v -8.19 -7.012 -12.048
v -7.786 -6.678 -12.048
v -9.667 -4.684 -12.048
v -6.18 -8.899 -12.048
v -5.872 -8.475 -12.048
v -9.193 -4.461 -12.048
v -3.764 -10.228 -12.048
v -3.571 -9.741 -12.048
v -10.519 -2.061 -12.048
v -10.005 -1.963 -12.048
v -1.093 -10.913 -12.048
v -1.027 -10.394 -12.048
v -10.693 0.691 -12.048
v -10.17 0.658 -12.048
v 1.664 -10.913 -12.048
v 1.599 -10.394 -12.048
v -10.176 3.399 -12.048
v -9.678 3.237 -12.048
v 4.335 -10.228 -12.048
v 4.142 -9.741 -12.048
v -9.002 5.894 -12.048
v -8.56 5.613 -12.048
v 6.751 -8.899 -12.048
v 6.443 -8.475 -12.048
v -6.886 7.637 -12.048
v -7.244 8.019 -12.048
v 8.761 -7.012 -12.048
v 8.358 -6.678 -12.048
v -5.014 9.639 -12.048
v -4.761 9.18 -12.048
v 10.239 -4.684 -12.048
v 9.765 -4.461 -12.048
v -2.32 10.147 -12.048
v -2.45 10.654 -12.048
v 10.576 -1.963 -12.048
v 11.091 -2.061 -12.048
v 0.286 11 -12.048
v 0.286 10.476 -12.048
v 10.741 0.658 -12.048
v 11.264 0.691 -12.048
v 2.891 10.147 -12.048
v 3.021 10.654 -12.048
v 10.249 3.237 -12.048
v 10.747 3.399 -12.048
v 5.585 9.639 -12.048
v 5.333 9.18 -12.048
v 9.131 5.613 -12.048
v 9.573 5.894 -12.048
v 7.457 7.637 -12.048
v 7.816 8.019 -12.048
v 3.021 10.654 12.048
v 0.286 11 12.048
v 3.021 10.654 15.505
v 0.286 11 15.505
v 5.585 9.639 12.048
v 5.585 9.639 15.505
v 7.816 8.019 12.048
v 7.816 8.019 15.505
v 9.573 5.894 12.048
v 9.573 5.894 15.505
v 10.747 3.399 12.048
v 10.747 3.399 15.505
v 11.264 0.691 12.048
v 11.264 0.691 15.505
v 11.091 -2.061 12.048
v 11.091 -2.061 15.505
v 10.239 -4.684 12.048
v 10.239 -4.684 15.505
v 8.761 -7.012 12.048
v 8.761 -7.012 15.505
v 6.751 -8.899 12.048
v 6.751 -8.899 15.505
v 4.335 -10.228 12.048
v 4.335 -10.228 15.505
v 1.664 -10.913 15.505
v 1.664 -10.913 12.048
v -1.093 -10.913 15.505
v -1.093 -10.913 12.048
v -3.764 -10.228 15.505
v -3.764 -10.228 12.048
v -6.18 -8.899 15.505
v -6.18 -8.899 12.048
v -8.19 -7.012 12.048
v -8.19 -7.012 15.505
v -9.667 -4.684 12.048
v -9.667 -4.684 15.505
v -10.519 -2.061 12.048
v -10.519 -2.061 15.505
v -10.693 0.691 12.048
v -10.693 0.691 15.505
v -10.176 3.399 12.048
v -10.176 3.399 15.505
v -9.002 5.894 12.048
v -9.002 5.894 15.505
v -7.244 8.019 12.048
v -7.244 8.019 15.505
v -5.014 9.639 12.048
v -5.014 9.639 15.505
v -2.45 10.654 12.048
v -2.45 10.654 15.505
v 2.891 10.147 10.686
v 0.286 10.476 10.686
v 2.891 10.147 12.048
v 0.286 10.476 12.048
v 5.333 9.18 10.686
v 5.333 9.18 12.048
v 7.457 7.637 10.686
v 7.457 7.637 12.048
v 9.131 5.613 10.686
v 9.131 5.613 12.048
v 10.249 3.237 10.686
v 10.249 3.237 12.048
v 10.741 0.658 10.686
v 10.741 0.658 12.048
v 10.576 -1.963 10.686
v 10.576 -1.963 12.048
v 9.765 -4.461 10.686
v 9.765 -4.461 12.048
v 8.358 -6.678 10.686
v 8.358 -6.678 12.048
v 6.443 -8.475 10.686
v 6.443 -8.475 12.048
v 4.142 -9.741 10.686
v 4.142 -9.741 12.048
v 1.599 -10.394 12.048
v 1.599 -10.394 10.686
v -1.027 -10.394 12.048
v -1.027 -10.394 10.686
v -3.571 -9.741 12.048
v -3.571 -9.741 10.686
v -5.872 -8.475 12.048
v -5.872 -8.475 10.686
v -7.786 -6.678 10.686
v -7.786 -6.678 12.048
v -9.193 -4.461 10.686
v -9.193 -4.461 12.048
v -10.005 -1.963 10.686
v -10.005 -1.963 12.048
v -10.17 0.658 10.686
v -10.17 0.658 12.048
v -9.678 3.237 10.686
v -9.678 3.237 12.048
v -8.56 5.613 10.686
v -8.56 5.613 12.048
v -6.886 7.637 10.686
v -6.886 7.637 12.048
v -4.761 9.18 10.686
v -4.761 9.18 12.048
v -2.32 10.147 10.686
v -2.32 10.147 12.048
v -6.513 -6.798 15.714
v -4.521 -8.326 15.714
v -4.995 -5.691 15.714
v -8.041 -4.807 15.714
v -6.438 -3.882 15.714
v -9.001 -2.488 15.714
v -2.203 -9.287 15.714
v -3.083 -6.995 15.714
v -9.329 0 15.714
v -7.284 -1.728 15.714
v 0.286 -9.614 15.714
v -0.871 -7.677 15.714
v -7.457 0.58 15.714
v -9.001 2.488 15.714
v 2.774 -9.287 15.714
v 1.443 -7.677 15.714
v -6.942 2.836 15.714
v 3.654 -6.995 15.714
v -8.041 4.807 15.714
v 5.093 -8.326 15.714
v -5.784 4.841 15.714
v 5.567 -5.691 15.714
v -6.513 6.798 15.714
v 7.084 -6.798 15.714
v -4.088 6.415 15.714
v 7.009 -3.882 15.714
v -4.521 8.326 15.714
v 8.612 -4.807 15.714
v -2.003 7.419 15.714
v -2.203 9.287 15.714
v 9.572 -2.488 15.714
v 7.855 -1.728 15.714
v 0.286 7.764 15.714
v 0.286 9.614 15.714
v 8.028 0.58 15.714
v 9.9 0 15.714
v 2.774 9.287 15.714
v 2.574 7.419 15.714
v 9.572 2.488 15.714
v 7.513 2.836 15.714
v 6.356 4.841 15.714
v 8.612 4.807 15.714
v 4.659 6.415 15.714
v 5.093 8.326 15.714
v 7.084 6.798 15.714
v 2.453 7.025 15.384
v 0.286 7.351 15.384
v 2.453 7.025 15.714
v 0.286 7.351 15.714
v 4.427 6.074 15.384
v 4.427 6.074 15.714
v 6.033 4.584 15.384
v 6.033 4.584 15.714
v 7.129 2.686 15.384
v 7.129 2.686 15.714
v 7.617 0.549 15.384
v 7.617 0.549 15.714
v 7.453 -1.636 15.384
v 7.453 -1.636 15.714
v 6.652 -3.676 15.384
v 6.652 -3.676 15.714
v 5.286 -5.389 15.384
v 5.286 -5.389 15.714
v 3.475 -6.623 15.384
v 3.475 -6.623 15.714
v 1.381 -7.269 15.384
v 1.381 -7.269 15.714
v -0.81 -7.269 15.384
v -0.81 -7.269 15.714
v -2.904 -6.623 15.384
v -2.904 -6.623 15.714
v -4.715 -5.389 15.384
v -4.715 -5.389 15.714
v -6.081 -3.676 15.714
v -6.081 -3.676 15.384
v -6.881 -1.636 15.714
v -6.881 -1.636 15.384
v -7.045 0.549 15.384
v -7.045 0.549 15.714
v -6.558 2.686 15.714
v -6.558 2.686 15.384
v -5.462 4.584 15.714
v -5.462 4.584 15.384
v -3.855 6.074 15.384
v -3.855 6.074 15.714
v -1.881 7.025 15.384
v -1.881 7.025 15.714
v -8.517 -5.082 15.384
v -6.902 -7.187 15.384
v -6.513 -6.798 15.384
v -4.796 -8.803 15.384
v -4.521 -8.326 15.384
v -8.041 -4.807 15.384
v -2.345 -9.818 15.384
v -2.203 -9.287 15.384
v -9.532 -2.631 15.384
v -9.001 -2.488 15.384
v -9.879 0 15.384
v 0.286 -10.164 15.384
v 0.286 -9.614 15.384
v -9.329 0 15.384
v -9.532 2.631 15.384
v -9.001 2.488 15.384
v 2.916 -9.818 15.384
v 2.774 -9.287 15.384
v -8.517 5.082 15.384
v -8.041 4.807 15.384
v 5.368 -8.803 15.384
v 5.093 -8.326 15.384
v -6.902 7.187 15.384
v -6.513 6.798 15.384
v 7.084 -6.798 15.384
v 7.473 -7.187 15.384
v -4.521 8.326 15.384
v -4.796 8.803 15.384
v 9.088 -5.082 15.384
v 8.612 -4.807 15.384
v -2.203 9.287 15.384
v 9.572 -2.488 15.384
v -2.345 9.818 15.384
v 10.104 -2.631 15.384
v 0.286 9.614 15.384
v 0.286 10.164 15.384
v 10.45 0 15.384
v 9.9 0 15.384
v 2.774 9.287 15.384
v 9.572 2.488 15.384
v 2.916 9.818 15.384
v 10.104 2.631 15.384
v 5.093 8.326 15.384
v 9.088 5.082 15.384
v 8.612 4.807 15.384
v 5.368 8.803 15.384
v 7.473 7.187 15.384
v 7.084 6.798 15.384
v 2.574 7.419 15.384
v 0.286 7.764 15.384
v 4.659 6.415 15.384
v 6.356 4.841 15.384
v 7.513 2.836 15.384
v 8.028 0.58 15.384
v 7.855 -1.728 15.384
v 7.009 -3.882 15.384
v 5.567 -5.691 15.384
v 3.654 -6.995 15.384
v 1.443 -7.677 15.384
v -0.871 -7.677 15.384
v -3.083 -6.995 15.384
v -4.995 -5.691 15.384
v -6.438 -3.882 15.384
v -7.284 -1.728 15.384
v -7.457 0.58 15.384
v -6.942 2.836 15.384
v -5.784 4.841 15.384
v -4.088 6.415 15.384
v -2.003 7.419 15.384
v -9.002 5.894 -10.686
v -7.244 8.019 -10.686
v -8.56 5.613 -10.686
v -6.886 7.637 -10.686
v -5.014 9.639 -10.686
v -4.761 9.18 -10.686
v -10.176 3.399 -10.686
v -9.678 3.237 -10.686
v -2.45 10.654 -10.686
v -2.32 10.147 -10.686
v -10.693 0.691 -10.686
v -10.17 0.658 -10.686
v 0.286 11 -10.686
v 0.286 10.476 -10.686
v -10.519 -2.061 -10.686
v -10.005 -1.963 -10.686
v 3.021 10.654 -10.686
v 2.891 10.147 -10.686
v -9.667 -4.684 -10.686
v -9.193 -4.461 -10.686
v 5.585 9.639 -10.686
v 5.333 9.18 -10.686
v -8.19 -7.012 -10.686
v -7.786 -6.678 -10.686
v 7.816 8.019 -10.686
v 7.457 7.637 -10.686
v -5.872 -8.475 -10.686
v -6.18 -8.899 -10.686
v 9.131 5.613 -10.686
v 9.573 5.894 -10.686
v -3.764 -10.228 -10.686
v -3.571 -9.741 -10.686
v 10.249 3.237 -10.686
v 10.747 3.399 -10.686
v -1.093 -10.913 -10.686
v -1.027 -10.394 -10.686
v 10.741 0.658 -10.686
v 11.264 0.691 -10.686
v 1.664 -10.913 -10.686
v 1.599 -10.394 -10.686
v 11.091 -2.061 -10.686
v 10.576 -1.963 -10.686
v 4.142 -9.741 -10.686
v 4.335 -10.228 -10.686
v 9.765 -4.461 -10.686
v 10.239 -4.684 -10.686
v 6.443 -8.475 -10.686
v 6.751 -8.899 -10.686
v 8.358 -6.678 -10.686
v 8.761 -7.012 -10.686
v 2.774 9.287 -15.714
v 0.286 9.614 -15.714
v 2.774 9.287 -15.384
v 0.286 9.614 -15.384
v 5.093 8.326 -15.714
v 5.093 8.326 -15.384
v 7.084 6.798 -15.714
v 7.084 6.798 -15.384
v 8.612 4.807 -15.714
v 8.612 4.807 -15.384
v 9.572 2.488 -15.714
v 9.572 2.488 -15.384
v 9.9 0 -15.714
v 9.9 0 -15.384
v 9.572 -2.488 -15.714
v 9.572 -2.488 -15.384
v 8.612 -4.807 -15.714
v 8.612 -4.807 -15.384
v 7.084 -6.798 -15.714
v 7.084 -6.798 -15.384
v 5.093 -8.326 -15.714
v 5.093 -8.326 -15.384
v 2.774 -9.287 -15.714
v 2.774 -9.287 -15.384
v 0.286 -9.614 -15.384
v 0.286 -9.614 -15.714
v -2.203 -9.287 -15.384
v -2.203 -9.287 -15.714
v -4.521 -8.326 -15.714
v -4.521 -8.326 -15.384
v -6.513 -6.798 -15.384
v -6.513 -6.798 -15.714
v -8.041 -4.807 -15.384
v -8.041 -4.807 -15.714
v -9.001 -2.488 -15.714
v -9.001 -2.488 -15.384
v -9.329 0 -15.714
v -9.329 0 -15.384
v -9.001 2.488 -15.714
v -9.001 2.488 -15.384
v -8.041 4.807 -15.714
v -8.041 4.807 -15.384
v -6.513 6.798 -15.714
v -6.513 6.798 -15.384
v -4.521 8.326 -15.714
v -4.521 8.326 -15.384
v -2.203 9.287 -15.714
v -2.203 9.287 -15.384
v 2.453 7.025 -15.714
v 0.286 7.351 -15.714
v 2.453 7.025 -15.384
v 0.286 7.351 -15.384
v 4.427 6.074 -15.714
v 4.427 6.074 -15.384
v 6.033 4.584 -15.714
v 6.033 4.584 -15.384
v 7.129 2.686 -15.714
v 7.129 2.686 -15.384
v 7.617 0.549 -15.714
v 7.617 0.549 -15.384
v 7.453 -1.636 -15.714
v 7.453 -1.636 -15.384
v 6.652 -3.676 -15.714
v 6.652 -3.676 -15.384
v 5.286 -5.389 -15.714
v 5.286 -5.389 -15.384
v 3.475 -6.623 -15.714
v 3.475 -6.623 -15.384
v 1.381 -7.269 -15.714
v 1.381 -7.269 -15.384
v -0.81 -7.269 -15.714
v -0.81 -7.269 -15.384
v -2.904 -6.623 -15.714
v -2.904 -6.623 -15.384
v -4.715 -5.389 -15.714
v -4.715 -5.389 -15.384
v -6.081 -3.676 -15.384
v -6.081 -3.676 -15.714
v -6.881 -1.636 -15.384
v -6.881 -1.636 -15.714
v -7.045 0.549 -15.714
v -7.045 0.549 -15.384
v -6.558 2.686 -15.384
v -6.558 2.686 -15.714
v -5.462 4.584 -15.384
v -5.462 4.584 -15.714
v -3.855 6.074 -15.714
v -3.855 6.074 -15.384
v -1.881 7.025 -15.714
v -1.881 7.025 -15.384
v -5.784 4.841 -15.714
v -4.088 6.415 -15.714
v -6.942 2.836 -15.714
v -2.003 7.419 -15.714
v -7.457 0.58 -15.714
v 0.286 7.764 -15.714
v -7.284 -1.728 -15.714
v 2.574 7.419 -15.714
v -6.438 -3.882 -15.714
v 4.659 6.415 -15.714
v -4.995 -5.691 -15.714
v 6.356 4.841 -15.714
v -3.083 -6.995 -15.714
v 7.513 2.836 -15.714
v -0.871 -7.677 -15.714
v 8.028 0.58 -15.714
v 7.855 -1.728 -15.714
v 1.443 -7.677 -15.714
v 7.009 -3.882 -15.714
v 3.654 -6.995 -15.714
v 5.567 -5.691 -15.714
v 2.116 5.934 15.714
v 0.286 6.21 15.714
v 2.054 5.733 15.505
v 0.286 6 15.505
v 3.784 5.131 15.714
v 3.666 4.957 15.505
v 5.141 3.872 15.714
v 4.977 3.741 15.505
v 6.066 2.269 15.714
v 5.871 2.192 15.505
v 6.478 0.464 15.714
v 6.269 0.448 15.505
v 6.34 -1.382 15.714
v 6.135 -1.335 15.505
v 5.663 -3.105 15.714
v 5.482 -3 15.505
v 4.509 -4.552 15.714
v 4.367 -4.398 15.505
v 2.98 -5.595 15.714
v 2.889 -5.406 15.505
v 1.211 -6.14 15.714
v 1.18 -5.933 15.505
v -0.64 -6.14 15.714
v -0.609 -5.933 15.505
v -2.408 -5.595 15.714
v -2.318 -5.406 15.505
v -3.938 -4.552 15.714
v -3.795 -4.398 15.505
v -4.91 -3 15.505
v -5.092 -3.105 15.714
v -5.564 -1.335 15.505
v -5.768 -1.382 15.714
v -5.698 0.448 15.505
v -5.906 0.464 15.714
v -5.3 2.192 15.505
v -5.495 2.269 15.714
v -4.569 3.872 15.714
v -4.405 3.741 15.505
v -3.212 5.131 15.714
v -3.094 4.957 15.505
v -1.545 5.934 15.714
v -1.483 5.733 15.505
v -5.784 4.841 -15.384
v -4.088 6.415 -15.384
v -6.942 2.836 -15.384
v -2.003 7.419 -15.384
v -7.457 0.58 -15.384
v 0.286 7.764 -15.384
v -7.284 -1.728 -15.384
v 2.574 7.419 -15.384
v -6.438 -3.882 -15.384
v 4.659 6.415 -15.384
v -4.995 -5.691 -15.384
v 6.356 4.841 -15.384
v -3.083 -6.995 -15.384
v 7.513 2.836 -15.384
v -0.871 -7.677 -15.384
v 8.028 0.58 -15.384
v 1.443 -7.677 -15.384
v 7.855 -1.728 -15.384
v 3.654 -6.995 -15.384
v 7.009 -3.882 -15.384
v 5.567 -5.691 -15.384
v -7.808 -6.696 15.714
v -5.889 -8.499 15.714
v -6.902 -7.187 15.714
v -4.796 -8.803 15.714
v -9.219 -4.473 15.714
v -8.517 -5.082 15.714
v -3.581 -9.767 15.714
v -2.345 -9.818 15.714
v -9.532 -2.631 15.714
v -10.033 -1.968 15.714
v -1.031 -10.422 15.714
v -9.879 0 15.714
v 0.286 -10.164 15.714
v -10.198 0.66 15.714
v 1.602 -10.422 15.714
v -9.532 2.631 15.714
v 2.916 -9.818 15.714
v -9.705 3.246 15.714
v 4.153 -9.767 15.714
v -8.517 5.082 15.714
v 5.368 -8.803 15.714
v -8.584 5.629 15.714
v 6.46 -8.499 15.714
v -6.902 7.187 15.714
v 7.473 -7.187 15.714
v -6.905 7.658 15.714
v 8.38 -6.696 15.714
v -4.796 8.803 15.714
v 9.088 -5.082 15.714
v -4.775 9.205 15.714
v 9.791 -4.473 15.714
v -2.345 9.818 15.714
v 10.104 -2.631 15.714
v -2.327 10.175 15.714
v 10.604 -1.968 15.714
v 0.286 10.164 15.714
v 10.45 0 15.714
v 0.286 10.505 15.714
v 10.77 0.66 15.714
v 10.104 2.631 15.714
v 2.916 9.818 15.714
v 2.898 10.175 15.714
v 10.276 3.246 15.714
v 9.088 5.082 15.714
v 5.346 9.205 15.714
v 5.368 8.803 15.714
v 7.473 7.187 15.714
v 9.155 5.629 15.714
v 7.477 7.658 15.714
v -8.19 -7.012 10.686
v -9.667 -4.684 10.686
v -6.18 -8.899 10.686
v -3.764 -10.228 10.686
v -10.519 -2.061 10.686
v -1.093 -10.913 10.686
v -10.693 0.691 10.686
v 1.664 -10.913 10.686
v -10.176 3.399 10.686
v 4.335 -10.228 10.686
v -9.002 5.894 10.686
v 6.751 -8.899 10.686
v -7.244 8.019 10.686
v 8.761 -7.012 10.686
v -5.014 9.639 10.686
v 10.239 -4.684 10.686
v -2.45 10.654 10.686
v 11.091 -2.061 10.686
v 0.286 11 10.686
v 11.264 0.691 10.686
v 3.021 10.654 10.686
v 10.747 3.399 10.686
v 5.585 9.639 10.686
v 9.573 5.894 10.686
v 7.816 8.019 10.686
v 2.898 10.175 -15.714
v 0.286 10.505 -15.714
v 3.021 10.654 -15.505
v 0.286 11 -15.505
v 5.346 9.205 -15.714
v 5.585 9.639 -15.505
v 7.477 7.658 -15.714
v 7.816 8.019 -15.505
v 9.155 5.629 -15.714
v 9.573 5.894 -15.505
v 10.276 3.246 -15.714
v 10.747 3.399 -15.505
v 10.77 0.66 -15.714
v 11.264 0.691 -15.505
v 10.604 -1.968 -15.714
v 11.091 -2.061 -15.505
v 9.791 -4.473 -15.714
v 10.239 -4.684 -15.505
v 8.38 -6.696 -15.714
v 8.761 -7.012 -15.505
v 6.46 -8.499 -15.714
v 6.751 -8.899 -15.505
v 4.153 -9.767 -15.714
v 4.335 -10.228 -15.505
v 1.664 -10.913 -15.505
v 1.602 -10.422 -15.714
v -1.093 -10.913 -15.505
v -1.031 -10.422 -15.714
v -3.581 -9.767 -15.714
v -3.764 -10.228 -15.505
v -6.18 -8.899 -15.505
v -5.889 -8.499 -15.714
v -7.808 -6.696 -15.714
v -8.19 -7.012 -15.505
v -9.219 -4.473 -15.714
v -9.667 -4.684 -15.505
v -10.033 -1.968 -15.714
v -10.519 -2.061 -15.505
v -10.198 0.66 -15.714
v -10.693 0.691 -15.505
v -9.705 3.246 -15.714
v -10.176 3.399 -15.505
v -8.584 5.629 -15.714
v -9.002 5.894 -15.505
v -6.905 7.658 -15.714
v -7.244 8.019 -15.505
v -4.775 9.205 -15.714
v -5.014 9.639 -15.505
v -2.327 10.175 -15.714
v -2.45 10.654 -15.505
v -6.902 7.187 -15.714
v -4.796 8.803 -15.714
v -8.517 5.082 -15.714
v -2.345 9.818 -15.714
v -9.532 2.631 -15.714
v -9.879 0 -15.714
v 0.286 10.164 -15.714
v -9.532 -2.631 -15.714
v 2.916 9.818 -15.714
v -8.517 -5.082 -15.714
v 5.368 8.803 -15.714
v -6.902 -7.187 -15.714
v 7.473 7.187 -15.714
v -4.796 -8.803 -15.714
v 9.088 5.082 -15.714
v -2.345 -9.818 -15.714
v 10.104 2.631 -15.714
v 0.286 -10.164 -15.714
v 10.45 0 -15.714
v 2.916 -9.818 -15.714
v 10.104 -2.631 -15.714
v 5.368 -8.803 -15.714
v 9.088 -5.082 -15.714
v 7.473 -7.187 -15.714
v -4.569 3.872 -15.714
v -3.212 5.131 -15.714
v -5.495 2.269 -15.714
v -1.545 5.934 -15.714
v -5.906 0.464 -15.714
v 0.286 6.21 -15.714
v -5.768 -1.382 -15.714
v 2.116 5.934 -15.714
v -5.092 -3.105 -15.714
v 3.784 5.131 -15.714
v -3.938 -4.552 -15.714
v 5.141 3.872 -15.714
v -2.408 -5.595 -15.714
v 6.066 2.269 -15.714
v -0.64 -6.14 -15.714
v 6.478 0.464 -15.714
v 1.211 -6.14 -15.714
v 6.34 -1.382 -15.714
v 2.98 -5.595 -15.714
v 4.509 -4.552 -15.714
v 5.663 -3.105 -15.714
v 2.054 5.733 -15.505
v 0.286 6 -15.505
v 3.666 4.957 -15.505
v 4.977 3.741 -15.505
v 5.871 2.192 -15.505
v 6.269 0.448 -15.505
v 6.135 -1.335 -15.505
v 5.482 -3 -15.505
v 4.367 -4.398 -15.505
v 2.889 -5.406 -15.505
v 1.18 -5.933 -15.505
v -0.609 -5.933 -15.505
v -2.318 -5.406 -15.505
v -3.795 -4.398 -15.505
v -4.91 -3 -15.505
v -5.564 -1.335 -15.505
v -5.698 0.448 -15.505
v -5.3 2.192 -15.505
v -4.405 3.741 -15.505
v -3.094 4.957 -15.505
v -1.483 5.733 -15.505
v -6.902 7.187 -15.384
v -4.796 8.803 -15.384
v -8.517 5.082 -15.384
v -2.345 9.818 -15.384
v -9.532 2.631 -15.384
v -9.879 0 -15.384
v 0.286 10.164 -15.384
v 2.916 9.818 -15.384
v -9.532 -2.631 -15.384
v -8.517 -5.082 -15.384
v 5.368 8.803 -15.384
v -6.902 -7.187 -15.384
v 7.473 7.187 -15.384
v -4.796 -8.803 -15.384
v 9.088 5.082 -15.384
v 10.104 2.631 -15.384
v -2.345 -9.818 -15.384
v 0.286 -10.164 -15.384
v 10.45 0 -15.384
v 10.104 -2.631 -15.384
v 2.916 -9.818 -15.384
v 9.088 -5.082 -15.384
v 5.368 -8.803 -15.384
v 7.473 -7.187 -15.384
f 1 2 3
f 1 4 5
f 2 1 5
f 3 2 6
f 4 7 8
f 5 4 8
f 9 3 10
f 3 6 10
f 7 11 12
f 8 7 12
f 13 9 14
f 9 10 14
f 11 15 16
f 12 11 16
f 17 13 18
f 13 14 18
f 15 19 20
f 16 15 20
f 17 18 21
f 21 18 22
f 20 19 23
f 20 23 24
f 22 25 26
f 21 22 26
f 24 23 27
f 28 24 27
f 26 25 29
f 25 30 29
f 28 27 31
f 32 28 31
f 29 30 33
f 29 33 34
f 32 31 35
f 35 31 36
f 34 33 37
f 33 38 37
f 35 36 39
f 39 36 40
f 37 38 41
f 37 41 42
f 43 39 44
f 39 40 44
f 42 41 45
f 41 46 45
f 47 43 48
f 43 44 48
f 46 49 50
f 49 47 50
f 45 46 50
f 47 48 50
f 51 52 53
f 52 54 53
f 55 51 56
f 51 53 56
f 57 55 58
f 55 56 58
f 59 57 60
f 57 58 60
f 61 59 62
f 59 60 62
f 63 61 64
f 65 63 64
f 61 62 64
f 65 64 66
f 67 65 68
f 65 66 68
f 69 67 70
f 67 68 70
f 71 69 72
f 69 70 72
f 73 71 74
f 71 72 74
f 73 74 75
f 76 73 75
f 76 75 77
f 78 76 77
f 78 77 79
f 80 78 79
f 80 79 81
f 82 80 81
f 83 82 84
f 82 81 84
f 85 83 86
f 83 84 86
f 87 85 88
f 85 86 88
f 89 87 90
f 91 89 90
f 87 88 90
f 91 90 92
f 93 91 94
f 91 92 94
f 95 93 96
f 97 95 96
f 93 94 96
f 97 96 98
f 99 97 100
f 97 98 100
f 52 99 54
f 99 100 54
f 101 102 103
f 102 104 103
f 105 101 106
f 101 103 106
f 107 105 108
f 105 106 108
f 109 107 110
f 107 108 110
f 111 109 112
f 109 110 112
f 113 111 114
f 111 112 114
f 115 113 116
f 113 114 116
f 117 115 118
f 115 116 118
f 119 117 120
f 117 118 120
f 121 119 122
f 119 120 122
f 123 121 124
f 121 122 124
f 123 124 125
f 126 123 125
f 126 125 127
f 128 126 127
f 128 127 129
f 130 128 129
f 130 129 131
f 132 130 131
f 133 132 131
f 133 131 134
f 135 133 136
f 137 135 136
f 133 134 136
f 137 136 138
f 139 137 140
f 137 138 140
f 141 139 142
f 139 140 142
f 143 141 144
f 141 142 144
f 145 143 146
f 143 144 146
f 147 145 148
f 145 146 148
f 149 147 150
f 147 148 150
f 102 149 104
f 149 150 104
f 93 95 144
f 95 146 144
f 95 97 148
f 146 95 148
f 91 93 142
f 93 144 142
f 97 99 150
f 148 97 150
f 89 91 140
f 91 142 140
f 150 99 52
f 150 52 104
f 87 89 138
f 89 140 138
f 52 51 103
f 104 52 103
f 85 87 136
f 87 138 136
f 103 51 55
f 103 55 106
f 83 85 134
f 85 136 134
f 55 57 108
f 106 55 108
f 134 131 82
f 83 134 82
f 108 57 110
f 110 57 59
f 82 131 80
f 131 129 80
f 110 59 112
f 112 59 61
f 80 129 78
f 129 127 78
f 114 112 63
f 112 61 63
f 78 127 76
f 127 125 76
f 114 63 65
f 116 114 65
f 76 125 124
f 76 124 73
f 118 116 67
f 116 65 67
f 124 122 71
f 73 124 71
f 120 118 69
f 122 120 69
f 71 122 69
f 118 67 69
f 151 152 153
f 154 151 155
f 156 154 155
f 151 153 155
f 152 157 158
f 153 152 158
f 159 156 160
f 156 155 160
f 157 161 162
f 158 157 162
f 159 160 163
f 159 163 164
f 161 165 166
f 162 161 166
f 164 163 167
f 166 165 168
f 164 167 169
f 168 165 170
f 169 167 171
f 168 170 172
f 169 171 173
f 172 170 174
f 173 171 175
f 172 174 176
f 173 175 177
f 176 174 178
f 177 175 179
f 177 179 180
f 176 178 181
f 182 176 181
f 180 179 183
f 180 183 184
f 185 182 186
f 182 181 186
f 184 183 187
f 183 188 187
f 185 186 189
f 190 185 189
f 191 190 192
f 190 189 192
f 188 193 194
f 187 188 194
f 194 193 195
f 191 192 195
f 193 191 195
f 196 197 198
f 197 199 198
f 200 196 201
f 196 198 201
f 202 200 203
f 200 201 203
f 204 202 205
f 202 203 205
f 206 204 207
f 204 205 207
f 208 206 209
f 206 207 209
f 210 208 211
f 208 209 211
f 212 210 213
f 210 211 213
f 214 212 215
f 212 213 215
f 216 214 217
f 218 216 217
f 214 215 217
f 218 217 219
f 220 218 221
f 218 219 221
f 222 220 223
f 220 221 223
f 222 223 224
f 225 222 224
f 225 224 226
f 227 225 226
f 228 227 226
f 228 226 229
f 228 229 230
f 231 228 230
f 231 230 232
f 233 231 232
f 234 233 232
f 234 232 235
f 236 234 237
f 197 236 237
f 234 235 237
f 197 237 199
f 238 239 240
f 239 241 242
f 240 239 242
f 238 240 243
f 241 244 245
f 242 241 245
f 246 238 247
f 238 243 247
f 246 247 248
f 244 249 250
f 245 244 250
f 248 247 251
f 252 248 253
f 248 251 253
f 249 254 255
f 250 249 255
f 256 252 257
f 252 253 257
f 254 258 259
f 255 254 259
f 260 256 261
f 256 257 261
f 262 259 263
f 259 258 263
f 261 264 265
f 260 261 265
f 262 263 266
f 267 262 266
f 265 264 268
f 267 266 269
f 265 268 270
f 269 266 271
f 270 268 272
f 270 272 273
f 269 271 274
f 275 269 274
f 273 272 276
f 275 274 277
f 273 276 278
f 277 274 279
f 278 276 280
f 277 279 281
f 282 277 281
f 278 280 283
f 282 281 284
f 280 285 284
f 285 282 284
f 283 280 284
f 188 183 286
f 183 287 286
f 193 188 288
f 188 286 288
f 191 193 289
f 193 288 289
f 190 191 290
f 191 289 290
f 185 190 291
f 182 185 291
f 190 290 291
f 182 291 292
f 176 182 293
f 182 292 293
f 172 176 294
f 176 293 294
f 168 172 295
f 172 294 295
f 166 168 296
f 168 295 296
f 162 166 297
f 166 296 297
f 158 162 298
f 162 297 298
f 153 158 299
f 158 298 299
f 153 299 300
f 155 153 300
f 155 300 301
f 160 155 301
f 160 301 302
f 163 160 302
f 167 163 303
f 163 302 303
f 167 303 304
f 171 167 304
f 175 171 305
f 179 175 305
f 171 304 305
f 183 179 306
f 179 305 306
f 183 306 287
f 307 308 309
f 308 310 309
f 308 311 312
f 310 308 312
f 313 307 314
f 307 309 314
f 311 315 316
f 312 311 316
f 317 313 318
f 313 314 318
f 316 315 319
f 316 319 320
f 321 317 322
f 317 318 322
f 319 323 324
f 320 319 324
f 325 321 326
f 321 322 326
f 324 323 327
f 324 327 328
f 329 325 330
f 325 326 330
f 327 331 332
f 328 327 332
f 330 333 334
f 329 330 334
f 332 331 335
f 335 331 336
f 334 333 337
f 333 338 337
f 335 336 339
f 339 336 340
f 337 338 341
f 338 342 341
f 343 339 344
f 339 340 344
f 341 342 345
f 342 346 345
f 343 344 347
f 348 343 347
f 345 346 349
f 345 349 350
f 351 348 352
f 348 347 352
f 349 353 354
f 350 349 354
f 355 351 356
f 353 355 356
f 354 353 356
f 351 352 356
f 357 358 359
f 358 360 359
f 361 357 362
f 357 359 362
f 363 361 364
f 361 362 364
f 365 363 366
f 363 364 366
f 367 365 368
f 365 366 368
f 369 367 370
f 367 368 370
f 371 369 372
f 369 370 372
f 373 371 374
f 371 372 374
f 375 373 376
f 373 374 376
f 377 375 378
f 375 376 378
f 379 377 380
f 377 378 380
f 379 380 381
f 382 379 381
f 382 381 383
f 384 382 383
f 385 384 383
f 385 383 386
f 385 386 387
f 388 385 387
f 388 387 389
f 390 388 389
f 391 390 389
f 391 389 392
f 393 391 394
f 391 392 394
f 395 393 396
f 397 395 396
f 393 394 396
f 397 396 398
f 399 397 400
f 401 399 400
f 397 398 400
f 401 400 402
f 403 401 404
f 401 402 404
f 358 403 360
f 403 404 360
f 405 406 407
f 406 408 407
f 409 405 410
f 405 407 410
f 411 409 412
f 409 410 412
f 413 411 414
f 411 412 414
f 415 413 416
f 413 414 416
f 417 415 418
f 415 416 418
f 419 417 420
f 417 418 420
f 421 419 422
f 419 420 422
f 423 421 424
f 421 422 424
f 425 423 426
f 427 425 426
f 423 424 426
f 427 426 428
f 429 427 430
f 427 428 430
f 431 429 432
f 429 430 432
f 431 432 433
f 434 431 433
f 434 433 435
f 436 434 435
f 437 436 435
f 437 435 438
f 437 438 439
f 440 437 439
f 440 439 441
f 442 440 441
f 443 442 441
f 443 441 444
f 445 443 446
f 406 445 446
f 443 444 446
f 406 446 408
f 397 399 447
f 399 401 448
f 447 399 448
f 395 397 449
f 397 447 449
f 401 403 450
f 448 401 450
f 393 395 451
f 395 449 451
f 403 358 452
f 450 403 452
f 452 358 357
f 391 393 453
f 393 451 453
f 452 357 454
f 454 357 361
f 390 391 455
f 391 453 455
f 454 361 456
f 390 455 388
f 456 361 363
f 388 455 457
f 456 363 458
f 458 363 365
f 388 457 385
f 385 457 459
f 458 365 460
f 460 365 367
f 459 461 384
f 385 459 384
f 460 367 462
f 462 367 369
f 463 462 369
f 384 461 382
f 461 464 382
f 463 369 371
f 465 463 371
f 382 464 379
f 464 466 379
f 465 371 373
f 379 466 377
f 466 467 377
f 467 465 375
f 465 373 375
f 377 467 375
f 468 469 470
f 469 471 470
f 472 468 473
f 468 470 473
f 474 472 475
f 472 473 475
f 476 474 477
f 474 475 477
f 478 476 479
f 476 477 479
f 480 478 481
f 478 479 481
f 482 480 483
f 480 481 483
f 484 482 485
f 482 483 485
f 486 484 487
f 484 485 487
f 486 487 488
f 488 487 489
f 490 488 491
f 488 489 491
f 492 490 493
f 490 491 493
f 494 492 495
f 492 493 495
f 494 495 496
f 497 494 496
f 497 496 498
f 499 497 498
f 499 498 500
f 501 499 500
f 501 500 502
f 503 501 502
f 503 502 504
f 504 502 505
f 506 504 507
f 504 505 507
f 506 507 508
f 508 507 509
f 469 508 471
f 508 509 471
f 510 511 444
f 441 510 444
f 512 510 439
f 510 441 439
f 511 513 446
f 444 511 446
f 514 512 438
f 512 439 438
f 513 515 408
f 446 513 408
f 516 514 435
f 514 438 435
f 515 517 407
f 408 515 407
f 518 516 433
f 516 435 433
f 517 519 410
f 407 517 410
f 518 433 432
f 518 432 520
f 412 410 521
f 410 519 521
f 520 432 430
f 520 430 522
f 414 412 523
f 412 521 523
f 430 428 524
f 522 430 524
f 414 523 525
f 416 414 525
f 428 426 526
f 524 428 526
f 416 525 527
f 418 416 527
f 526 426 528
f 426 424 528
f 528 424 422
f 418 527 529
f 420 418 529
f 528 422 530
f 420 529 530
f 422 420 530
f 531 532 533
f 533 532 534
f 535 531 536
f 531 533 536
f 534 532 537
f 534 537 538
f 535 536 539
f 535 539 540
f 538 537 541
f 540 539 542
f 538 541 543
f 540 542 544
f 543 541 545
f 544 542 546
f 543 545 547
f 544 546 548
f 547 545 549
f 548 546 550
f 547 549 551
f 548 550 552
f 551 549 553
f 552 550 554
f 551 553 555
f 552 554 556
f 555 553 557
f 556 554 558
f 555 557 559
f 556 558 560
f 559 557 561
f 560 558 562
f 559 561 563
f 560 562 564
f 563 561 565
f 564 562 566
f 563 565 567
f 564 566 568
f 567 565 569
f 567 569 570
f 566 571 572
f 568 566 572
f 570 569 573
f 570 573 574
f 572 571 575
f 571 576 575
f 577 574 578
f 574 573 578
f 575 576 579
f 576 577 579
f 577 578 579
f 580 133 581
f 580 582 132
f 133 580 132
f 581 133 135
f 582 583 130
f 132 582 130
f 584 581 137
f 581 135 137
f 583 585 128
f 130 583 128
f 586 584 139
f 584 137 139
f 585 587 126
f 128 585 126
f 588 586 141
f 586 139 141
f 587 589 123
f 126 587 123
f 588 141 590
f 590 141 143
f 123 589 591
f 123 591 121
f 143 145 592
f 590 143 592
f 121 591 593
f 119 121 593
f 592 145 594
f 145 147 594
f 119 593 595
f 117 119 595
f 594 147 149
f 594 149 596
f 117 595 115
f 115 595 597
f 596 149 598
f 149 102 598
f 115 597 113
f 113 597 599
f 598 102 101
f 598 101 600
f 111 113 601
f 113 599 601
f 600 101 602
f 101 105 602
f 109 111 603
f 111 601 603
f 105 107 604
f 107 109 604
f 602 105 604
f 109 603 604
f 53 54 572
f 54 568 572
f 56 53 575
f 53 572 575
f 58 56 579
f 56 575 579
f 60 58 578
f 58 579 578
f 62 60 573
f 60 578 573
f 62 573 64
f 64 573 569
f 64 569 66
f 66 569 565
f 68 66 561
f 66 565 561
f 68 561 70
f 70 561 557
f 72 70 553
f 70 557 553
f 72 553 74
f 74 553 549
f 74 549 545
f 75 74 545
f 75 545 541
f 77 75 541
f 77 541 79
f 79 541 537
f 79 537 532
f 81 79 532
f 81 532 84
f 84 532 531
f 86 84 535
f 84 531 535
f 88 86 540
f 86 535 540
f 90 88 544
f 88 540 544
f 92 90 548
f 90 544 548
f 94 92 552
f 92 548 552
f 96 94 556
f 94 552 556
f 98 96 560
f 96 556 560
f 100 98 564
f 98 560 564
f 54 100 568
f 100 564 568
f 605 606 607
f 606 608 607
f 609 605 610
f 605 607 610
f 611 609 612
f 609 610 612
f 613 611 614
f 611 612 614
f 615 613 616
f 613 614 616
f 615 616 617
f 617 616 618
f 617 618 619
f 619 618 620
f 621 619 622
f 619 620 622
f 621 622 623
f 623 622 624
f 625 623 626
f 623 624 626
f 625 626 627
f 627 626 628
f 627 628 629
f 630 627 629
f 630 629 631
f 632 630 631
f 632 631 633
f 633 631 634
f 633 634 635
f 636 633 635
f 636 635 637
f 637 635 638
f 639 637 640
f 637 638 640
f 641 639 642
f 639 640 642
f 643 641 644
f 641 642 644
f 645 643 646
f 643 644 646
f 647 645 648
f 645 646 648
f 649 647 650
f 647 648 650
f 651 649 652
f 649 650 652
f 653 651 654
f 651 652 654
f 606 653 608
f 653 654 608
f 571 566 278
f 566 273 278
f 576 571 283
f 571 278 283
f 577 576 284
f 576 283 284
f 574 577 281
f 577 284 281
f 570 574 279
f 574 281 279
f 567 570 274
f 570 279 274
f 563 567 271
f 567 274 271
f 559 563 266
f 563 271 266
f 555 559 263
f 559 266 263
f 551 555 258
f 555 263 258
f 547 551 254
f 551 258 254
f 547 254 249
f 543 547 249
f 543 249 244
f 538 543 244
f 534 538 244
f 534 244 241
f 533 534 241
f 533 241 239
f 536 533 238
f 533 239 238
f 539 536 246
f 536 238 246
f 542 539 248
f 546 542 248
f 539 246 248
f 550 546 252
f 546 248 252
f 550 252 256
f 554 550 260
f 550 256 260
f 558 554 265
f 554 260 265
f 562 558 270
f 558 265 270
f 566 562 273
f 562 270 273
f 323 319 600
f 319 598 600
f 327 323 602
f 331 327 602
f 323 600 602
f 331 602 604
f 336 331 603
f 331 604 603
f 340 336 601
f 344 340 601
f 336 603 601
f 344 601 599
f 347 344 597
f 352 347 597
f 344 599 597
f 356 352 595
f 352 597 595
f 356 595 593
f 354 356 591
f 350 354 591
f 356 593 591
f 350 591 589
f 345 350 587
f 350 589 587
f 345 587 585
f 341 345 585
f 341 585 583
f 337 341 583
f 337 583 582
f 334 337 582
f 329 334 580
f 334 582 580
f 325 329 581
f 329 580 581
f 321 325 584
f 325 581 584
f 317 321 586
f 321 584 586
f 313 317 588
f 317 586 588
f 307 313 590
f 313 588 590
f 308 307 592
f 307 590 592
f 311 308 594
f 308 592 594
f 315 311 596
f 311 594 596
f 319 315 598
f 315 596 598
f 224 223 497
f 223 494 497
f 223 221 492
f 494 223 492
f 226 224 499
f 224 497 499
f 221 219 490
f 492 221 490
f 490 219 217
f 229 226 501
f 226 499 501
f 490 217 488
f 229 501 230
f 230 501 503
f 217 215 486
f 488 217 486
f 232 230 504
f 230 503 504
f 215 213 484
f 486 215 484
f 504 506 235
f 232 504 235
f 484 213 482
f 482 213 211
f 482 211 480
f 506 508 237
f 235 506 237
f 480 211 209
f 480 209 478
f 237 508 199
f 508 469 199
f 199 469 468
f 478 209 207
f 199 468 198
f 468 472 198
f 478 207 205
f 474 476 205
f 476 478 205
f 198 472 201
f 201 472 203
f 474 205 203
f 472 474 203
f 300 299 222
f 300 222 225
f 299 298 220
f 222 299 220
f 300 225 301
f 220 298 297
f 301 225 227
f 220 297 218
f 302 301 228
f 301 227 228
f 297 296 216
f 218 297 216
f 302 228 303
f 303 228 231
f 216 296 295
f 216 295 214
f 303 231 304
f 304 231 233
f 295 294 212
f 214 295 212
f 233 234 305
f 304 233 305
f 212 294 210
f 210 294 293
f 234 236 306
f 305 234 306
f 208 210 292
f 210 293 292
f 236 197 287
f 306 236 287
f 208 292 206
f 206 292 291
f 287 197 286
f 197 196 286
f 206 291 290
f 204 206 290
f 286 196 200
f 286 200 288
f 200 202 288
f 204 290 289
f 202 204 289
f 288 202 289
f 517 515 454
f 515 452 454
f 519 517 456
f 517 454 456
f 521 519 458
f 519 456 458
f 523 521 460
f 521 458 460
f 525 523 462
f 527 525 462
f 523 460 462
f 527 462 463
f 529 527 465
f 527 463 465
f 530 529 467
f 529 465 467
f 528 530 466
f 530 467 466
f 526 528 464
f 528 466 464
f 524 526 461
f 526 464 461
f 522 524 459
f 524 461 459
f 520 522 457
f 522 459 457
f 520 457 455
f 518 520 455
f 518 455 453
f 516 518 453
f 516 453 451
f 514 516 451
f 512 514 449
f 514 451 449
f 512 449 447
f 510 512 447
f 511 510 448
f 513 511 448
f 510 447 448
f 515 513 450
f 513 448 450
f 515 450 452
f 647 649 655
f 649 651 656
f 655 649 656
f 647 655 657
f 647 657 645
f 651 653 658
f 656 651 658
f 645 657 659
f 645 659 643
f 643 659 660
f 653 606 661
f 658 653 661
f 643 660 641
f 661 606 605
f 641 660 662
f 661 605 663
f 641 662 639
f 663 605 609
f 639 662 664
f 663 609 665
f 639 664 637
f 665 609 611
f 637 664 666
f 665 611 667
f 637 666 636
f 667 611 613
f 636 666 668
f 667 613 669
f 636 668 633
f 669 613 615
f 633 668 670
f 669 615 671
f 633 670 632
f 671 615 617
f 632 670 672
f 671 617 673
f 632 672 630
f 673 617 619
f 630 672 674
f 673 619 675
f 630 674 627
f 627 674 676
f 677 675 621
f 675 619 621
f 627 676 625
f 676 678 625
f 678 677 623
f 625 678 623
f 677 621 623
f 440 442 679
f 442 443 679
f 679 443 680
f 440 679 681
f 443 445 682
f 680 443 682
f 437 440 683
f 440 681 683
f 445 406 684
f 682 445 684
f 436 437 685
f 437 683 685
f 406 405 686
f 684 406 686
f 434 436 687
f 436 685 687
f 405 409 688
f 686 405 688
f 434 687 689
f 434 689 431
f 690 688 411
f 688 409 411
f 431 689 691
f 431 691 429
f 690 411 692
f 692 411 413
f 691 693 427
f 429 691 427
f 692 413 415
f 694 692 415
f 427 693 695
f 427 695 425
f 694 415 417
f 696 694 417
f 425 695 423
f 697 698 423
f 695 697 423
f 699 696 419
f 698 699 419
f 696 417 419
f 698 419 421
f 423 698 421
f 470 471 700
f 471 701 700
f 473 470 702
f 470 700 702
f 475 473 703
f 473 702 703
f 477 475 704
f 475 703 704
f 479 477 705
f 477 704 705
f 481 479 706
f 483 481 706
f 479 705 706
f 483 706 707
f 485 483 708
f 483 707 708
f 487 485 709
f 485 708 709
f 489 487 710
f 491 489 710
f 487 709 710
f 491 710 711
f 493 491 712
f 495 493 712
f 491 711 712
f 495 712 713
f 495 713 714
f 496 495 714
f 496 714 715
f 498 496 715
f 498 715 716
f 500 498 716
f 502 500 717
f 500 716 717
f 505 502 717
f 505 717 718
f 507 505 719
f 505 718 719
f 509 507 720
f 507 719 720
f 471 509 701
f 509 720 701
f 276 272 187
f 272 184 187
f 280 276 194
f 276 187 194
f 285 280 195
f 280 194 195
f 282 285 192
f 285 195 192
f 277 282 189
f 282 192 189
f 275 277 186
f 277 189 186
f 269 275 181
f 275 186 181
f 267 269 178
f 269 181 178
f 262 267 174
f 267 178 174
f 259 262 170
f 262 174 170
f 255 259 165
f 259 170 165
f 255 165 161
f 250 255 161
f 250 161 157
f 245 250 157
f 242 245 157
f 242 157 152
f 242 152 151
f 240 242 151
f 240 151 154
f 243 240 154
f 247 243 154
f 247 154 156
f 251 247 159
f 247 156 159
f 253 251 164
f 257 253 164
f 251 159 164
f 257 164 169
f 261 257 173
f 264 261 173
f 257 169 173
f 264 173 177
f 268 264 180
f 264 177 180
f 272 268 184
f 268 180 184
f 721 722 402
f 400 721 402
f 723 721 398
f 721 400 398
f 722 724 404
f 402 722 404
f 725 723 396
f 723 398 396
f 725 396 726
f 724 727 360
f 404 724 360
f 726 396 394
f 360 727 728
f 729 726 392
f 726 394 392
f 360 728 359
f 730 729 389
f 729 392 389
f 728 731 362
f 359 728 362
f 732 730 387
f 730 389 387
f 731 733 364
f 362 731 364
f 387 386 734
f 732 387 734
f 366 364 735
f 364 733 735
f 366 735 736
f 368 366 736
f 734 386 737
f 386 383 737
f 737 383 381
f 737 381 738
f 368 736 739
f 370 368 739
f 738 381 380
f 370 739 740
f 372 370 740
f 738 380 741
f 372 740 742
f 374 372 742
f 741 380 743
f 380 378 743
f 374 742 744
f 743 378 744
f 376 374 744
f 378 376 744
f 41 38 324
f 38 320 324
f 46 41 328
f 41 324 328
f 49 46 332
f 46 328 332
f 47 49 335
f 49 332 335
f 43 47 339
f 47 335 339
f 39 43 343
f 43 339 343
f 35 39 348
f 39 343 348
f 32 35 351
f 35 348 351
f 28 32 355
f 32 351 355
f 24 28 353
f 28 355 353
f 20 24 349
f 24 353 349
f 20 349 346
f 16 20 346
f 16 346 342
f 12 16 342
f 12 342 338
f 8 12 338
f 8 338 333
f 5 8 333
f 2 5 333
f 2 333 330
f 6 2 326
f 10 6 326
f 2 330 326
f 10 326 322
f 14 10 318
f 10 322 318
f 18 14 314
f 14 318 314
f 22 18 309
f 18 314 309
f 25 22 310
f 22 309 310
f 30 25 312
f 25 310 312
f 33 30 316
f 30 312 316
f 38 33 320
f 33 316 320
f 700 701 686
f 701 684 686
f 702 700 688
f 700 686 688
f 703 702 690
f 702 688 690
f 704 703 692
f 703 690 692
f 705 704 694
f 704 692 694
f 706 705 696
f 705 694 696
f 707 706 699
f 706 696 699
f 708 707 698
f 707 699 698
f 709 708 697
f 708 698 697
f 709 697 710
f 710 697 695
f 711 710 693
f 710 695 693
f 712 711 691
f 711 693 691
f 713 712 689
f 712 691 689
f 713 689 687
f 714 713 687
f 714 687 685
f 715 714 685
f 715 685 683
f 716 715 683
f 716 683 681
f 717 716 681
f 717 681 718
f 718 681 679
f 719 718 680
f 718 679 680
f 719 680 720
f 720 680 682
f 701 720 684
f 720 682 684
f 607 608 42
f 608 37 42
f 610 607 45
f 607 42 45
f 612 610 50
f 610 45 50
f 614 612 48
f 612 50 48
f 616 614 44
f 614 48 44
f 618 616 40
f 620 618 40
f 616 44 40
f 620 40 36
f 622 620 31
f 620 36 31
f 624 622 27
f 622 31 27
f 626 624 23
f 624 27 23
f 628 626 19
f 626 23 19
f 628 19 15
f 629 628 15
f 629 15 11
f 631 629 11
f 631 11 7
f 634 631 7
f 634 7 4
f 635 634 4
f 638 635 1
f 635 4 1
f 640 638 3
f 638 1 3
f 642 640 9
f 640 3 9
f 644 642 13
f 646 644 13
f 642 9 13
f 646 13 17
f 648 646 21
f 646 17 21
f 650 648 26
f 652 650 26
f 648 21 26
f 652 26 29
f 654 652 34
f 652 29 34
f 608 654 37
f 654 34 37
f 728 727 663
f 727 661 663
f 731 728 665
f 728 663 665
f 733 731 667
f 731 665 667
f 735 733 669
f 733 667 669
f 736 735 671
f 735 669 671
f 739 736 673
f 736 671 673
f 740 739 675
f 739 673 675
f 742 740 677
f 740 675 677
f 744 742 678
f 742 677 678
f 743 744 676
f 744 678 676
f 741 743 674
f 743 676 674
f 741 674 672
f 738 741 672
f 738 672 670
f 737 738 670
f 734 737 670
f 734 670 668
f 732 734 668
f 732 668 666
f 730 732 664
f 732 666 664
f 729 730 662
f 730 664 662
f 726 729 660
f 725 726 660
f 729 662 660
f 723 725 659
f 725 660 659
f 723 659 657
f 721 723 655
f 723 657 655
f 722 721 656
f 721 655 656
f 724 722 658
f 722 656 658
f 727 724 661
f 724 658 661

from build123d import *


with BuildPart() as part:
    # Sketch1 → Revolve1 (revolve)
    with BuildSketch(Plane.XZ, mode=Mode.PRIVATE) as revolve1_sk:
        Polygon((6.495238095, 15.714285714), (6.285714286, 15.504761905), (6.285714286, -15.504761905), (6.495238095, -15.714285714), (7.637142857, -15.714285714), (7.637142857, -15.384285714), (8.049642857, -15.384285714), (8.049642857, -15.714285714), (9.9, -15.714285714), (9.9, -15.384285714), (10.45, -15.384285714), (10.45, -15.714285714), (10.79047619, -15.714285714), (11.285714286, -15.504761905), (11.285714286, -12.047619048), (10.761904762, -12.047619048), (10.761904762, -10.685714286), (11.285714286, -10.685714286), (11.285714286, 10.685714286), (10.761904762, 10.685714286), (10.761904762, 12.047619048), (11.285714286, 12.047619048), (11.285714286, 15.504761905), (10.79047619, 15.714285714), (10.45, 15.714285714), (10.45, 15.384285714), (9.9, 15.384285714), (9.9, 15.714285714), (8.049642857, 15.714285714), (8.049642857, 15.384285714), (7.637142857, 15.384285714), (7.637142857, 15.714285714), align=None)
    revolve(revolve1_sk.sketch.rotate(Axis((0.285714286, 0, 15.714285714), (0, 0, -1)), 270), axis=Axis((0.285714286, 0, 15.714285714), (0, 0, -1)))


solid = part.part
